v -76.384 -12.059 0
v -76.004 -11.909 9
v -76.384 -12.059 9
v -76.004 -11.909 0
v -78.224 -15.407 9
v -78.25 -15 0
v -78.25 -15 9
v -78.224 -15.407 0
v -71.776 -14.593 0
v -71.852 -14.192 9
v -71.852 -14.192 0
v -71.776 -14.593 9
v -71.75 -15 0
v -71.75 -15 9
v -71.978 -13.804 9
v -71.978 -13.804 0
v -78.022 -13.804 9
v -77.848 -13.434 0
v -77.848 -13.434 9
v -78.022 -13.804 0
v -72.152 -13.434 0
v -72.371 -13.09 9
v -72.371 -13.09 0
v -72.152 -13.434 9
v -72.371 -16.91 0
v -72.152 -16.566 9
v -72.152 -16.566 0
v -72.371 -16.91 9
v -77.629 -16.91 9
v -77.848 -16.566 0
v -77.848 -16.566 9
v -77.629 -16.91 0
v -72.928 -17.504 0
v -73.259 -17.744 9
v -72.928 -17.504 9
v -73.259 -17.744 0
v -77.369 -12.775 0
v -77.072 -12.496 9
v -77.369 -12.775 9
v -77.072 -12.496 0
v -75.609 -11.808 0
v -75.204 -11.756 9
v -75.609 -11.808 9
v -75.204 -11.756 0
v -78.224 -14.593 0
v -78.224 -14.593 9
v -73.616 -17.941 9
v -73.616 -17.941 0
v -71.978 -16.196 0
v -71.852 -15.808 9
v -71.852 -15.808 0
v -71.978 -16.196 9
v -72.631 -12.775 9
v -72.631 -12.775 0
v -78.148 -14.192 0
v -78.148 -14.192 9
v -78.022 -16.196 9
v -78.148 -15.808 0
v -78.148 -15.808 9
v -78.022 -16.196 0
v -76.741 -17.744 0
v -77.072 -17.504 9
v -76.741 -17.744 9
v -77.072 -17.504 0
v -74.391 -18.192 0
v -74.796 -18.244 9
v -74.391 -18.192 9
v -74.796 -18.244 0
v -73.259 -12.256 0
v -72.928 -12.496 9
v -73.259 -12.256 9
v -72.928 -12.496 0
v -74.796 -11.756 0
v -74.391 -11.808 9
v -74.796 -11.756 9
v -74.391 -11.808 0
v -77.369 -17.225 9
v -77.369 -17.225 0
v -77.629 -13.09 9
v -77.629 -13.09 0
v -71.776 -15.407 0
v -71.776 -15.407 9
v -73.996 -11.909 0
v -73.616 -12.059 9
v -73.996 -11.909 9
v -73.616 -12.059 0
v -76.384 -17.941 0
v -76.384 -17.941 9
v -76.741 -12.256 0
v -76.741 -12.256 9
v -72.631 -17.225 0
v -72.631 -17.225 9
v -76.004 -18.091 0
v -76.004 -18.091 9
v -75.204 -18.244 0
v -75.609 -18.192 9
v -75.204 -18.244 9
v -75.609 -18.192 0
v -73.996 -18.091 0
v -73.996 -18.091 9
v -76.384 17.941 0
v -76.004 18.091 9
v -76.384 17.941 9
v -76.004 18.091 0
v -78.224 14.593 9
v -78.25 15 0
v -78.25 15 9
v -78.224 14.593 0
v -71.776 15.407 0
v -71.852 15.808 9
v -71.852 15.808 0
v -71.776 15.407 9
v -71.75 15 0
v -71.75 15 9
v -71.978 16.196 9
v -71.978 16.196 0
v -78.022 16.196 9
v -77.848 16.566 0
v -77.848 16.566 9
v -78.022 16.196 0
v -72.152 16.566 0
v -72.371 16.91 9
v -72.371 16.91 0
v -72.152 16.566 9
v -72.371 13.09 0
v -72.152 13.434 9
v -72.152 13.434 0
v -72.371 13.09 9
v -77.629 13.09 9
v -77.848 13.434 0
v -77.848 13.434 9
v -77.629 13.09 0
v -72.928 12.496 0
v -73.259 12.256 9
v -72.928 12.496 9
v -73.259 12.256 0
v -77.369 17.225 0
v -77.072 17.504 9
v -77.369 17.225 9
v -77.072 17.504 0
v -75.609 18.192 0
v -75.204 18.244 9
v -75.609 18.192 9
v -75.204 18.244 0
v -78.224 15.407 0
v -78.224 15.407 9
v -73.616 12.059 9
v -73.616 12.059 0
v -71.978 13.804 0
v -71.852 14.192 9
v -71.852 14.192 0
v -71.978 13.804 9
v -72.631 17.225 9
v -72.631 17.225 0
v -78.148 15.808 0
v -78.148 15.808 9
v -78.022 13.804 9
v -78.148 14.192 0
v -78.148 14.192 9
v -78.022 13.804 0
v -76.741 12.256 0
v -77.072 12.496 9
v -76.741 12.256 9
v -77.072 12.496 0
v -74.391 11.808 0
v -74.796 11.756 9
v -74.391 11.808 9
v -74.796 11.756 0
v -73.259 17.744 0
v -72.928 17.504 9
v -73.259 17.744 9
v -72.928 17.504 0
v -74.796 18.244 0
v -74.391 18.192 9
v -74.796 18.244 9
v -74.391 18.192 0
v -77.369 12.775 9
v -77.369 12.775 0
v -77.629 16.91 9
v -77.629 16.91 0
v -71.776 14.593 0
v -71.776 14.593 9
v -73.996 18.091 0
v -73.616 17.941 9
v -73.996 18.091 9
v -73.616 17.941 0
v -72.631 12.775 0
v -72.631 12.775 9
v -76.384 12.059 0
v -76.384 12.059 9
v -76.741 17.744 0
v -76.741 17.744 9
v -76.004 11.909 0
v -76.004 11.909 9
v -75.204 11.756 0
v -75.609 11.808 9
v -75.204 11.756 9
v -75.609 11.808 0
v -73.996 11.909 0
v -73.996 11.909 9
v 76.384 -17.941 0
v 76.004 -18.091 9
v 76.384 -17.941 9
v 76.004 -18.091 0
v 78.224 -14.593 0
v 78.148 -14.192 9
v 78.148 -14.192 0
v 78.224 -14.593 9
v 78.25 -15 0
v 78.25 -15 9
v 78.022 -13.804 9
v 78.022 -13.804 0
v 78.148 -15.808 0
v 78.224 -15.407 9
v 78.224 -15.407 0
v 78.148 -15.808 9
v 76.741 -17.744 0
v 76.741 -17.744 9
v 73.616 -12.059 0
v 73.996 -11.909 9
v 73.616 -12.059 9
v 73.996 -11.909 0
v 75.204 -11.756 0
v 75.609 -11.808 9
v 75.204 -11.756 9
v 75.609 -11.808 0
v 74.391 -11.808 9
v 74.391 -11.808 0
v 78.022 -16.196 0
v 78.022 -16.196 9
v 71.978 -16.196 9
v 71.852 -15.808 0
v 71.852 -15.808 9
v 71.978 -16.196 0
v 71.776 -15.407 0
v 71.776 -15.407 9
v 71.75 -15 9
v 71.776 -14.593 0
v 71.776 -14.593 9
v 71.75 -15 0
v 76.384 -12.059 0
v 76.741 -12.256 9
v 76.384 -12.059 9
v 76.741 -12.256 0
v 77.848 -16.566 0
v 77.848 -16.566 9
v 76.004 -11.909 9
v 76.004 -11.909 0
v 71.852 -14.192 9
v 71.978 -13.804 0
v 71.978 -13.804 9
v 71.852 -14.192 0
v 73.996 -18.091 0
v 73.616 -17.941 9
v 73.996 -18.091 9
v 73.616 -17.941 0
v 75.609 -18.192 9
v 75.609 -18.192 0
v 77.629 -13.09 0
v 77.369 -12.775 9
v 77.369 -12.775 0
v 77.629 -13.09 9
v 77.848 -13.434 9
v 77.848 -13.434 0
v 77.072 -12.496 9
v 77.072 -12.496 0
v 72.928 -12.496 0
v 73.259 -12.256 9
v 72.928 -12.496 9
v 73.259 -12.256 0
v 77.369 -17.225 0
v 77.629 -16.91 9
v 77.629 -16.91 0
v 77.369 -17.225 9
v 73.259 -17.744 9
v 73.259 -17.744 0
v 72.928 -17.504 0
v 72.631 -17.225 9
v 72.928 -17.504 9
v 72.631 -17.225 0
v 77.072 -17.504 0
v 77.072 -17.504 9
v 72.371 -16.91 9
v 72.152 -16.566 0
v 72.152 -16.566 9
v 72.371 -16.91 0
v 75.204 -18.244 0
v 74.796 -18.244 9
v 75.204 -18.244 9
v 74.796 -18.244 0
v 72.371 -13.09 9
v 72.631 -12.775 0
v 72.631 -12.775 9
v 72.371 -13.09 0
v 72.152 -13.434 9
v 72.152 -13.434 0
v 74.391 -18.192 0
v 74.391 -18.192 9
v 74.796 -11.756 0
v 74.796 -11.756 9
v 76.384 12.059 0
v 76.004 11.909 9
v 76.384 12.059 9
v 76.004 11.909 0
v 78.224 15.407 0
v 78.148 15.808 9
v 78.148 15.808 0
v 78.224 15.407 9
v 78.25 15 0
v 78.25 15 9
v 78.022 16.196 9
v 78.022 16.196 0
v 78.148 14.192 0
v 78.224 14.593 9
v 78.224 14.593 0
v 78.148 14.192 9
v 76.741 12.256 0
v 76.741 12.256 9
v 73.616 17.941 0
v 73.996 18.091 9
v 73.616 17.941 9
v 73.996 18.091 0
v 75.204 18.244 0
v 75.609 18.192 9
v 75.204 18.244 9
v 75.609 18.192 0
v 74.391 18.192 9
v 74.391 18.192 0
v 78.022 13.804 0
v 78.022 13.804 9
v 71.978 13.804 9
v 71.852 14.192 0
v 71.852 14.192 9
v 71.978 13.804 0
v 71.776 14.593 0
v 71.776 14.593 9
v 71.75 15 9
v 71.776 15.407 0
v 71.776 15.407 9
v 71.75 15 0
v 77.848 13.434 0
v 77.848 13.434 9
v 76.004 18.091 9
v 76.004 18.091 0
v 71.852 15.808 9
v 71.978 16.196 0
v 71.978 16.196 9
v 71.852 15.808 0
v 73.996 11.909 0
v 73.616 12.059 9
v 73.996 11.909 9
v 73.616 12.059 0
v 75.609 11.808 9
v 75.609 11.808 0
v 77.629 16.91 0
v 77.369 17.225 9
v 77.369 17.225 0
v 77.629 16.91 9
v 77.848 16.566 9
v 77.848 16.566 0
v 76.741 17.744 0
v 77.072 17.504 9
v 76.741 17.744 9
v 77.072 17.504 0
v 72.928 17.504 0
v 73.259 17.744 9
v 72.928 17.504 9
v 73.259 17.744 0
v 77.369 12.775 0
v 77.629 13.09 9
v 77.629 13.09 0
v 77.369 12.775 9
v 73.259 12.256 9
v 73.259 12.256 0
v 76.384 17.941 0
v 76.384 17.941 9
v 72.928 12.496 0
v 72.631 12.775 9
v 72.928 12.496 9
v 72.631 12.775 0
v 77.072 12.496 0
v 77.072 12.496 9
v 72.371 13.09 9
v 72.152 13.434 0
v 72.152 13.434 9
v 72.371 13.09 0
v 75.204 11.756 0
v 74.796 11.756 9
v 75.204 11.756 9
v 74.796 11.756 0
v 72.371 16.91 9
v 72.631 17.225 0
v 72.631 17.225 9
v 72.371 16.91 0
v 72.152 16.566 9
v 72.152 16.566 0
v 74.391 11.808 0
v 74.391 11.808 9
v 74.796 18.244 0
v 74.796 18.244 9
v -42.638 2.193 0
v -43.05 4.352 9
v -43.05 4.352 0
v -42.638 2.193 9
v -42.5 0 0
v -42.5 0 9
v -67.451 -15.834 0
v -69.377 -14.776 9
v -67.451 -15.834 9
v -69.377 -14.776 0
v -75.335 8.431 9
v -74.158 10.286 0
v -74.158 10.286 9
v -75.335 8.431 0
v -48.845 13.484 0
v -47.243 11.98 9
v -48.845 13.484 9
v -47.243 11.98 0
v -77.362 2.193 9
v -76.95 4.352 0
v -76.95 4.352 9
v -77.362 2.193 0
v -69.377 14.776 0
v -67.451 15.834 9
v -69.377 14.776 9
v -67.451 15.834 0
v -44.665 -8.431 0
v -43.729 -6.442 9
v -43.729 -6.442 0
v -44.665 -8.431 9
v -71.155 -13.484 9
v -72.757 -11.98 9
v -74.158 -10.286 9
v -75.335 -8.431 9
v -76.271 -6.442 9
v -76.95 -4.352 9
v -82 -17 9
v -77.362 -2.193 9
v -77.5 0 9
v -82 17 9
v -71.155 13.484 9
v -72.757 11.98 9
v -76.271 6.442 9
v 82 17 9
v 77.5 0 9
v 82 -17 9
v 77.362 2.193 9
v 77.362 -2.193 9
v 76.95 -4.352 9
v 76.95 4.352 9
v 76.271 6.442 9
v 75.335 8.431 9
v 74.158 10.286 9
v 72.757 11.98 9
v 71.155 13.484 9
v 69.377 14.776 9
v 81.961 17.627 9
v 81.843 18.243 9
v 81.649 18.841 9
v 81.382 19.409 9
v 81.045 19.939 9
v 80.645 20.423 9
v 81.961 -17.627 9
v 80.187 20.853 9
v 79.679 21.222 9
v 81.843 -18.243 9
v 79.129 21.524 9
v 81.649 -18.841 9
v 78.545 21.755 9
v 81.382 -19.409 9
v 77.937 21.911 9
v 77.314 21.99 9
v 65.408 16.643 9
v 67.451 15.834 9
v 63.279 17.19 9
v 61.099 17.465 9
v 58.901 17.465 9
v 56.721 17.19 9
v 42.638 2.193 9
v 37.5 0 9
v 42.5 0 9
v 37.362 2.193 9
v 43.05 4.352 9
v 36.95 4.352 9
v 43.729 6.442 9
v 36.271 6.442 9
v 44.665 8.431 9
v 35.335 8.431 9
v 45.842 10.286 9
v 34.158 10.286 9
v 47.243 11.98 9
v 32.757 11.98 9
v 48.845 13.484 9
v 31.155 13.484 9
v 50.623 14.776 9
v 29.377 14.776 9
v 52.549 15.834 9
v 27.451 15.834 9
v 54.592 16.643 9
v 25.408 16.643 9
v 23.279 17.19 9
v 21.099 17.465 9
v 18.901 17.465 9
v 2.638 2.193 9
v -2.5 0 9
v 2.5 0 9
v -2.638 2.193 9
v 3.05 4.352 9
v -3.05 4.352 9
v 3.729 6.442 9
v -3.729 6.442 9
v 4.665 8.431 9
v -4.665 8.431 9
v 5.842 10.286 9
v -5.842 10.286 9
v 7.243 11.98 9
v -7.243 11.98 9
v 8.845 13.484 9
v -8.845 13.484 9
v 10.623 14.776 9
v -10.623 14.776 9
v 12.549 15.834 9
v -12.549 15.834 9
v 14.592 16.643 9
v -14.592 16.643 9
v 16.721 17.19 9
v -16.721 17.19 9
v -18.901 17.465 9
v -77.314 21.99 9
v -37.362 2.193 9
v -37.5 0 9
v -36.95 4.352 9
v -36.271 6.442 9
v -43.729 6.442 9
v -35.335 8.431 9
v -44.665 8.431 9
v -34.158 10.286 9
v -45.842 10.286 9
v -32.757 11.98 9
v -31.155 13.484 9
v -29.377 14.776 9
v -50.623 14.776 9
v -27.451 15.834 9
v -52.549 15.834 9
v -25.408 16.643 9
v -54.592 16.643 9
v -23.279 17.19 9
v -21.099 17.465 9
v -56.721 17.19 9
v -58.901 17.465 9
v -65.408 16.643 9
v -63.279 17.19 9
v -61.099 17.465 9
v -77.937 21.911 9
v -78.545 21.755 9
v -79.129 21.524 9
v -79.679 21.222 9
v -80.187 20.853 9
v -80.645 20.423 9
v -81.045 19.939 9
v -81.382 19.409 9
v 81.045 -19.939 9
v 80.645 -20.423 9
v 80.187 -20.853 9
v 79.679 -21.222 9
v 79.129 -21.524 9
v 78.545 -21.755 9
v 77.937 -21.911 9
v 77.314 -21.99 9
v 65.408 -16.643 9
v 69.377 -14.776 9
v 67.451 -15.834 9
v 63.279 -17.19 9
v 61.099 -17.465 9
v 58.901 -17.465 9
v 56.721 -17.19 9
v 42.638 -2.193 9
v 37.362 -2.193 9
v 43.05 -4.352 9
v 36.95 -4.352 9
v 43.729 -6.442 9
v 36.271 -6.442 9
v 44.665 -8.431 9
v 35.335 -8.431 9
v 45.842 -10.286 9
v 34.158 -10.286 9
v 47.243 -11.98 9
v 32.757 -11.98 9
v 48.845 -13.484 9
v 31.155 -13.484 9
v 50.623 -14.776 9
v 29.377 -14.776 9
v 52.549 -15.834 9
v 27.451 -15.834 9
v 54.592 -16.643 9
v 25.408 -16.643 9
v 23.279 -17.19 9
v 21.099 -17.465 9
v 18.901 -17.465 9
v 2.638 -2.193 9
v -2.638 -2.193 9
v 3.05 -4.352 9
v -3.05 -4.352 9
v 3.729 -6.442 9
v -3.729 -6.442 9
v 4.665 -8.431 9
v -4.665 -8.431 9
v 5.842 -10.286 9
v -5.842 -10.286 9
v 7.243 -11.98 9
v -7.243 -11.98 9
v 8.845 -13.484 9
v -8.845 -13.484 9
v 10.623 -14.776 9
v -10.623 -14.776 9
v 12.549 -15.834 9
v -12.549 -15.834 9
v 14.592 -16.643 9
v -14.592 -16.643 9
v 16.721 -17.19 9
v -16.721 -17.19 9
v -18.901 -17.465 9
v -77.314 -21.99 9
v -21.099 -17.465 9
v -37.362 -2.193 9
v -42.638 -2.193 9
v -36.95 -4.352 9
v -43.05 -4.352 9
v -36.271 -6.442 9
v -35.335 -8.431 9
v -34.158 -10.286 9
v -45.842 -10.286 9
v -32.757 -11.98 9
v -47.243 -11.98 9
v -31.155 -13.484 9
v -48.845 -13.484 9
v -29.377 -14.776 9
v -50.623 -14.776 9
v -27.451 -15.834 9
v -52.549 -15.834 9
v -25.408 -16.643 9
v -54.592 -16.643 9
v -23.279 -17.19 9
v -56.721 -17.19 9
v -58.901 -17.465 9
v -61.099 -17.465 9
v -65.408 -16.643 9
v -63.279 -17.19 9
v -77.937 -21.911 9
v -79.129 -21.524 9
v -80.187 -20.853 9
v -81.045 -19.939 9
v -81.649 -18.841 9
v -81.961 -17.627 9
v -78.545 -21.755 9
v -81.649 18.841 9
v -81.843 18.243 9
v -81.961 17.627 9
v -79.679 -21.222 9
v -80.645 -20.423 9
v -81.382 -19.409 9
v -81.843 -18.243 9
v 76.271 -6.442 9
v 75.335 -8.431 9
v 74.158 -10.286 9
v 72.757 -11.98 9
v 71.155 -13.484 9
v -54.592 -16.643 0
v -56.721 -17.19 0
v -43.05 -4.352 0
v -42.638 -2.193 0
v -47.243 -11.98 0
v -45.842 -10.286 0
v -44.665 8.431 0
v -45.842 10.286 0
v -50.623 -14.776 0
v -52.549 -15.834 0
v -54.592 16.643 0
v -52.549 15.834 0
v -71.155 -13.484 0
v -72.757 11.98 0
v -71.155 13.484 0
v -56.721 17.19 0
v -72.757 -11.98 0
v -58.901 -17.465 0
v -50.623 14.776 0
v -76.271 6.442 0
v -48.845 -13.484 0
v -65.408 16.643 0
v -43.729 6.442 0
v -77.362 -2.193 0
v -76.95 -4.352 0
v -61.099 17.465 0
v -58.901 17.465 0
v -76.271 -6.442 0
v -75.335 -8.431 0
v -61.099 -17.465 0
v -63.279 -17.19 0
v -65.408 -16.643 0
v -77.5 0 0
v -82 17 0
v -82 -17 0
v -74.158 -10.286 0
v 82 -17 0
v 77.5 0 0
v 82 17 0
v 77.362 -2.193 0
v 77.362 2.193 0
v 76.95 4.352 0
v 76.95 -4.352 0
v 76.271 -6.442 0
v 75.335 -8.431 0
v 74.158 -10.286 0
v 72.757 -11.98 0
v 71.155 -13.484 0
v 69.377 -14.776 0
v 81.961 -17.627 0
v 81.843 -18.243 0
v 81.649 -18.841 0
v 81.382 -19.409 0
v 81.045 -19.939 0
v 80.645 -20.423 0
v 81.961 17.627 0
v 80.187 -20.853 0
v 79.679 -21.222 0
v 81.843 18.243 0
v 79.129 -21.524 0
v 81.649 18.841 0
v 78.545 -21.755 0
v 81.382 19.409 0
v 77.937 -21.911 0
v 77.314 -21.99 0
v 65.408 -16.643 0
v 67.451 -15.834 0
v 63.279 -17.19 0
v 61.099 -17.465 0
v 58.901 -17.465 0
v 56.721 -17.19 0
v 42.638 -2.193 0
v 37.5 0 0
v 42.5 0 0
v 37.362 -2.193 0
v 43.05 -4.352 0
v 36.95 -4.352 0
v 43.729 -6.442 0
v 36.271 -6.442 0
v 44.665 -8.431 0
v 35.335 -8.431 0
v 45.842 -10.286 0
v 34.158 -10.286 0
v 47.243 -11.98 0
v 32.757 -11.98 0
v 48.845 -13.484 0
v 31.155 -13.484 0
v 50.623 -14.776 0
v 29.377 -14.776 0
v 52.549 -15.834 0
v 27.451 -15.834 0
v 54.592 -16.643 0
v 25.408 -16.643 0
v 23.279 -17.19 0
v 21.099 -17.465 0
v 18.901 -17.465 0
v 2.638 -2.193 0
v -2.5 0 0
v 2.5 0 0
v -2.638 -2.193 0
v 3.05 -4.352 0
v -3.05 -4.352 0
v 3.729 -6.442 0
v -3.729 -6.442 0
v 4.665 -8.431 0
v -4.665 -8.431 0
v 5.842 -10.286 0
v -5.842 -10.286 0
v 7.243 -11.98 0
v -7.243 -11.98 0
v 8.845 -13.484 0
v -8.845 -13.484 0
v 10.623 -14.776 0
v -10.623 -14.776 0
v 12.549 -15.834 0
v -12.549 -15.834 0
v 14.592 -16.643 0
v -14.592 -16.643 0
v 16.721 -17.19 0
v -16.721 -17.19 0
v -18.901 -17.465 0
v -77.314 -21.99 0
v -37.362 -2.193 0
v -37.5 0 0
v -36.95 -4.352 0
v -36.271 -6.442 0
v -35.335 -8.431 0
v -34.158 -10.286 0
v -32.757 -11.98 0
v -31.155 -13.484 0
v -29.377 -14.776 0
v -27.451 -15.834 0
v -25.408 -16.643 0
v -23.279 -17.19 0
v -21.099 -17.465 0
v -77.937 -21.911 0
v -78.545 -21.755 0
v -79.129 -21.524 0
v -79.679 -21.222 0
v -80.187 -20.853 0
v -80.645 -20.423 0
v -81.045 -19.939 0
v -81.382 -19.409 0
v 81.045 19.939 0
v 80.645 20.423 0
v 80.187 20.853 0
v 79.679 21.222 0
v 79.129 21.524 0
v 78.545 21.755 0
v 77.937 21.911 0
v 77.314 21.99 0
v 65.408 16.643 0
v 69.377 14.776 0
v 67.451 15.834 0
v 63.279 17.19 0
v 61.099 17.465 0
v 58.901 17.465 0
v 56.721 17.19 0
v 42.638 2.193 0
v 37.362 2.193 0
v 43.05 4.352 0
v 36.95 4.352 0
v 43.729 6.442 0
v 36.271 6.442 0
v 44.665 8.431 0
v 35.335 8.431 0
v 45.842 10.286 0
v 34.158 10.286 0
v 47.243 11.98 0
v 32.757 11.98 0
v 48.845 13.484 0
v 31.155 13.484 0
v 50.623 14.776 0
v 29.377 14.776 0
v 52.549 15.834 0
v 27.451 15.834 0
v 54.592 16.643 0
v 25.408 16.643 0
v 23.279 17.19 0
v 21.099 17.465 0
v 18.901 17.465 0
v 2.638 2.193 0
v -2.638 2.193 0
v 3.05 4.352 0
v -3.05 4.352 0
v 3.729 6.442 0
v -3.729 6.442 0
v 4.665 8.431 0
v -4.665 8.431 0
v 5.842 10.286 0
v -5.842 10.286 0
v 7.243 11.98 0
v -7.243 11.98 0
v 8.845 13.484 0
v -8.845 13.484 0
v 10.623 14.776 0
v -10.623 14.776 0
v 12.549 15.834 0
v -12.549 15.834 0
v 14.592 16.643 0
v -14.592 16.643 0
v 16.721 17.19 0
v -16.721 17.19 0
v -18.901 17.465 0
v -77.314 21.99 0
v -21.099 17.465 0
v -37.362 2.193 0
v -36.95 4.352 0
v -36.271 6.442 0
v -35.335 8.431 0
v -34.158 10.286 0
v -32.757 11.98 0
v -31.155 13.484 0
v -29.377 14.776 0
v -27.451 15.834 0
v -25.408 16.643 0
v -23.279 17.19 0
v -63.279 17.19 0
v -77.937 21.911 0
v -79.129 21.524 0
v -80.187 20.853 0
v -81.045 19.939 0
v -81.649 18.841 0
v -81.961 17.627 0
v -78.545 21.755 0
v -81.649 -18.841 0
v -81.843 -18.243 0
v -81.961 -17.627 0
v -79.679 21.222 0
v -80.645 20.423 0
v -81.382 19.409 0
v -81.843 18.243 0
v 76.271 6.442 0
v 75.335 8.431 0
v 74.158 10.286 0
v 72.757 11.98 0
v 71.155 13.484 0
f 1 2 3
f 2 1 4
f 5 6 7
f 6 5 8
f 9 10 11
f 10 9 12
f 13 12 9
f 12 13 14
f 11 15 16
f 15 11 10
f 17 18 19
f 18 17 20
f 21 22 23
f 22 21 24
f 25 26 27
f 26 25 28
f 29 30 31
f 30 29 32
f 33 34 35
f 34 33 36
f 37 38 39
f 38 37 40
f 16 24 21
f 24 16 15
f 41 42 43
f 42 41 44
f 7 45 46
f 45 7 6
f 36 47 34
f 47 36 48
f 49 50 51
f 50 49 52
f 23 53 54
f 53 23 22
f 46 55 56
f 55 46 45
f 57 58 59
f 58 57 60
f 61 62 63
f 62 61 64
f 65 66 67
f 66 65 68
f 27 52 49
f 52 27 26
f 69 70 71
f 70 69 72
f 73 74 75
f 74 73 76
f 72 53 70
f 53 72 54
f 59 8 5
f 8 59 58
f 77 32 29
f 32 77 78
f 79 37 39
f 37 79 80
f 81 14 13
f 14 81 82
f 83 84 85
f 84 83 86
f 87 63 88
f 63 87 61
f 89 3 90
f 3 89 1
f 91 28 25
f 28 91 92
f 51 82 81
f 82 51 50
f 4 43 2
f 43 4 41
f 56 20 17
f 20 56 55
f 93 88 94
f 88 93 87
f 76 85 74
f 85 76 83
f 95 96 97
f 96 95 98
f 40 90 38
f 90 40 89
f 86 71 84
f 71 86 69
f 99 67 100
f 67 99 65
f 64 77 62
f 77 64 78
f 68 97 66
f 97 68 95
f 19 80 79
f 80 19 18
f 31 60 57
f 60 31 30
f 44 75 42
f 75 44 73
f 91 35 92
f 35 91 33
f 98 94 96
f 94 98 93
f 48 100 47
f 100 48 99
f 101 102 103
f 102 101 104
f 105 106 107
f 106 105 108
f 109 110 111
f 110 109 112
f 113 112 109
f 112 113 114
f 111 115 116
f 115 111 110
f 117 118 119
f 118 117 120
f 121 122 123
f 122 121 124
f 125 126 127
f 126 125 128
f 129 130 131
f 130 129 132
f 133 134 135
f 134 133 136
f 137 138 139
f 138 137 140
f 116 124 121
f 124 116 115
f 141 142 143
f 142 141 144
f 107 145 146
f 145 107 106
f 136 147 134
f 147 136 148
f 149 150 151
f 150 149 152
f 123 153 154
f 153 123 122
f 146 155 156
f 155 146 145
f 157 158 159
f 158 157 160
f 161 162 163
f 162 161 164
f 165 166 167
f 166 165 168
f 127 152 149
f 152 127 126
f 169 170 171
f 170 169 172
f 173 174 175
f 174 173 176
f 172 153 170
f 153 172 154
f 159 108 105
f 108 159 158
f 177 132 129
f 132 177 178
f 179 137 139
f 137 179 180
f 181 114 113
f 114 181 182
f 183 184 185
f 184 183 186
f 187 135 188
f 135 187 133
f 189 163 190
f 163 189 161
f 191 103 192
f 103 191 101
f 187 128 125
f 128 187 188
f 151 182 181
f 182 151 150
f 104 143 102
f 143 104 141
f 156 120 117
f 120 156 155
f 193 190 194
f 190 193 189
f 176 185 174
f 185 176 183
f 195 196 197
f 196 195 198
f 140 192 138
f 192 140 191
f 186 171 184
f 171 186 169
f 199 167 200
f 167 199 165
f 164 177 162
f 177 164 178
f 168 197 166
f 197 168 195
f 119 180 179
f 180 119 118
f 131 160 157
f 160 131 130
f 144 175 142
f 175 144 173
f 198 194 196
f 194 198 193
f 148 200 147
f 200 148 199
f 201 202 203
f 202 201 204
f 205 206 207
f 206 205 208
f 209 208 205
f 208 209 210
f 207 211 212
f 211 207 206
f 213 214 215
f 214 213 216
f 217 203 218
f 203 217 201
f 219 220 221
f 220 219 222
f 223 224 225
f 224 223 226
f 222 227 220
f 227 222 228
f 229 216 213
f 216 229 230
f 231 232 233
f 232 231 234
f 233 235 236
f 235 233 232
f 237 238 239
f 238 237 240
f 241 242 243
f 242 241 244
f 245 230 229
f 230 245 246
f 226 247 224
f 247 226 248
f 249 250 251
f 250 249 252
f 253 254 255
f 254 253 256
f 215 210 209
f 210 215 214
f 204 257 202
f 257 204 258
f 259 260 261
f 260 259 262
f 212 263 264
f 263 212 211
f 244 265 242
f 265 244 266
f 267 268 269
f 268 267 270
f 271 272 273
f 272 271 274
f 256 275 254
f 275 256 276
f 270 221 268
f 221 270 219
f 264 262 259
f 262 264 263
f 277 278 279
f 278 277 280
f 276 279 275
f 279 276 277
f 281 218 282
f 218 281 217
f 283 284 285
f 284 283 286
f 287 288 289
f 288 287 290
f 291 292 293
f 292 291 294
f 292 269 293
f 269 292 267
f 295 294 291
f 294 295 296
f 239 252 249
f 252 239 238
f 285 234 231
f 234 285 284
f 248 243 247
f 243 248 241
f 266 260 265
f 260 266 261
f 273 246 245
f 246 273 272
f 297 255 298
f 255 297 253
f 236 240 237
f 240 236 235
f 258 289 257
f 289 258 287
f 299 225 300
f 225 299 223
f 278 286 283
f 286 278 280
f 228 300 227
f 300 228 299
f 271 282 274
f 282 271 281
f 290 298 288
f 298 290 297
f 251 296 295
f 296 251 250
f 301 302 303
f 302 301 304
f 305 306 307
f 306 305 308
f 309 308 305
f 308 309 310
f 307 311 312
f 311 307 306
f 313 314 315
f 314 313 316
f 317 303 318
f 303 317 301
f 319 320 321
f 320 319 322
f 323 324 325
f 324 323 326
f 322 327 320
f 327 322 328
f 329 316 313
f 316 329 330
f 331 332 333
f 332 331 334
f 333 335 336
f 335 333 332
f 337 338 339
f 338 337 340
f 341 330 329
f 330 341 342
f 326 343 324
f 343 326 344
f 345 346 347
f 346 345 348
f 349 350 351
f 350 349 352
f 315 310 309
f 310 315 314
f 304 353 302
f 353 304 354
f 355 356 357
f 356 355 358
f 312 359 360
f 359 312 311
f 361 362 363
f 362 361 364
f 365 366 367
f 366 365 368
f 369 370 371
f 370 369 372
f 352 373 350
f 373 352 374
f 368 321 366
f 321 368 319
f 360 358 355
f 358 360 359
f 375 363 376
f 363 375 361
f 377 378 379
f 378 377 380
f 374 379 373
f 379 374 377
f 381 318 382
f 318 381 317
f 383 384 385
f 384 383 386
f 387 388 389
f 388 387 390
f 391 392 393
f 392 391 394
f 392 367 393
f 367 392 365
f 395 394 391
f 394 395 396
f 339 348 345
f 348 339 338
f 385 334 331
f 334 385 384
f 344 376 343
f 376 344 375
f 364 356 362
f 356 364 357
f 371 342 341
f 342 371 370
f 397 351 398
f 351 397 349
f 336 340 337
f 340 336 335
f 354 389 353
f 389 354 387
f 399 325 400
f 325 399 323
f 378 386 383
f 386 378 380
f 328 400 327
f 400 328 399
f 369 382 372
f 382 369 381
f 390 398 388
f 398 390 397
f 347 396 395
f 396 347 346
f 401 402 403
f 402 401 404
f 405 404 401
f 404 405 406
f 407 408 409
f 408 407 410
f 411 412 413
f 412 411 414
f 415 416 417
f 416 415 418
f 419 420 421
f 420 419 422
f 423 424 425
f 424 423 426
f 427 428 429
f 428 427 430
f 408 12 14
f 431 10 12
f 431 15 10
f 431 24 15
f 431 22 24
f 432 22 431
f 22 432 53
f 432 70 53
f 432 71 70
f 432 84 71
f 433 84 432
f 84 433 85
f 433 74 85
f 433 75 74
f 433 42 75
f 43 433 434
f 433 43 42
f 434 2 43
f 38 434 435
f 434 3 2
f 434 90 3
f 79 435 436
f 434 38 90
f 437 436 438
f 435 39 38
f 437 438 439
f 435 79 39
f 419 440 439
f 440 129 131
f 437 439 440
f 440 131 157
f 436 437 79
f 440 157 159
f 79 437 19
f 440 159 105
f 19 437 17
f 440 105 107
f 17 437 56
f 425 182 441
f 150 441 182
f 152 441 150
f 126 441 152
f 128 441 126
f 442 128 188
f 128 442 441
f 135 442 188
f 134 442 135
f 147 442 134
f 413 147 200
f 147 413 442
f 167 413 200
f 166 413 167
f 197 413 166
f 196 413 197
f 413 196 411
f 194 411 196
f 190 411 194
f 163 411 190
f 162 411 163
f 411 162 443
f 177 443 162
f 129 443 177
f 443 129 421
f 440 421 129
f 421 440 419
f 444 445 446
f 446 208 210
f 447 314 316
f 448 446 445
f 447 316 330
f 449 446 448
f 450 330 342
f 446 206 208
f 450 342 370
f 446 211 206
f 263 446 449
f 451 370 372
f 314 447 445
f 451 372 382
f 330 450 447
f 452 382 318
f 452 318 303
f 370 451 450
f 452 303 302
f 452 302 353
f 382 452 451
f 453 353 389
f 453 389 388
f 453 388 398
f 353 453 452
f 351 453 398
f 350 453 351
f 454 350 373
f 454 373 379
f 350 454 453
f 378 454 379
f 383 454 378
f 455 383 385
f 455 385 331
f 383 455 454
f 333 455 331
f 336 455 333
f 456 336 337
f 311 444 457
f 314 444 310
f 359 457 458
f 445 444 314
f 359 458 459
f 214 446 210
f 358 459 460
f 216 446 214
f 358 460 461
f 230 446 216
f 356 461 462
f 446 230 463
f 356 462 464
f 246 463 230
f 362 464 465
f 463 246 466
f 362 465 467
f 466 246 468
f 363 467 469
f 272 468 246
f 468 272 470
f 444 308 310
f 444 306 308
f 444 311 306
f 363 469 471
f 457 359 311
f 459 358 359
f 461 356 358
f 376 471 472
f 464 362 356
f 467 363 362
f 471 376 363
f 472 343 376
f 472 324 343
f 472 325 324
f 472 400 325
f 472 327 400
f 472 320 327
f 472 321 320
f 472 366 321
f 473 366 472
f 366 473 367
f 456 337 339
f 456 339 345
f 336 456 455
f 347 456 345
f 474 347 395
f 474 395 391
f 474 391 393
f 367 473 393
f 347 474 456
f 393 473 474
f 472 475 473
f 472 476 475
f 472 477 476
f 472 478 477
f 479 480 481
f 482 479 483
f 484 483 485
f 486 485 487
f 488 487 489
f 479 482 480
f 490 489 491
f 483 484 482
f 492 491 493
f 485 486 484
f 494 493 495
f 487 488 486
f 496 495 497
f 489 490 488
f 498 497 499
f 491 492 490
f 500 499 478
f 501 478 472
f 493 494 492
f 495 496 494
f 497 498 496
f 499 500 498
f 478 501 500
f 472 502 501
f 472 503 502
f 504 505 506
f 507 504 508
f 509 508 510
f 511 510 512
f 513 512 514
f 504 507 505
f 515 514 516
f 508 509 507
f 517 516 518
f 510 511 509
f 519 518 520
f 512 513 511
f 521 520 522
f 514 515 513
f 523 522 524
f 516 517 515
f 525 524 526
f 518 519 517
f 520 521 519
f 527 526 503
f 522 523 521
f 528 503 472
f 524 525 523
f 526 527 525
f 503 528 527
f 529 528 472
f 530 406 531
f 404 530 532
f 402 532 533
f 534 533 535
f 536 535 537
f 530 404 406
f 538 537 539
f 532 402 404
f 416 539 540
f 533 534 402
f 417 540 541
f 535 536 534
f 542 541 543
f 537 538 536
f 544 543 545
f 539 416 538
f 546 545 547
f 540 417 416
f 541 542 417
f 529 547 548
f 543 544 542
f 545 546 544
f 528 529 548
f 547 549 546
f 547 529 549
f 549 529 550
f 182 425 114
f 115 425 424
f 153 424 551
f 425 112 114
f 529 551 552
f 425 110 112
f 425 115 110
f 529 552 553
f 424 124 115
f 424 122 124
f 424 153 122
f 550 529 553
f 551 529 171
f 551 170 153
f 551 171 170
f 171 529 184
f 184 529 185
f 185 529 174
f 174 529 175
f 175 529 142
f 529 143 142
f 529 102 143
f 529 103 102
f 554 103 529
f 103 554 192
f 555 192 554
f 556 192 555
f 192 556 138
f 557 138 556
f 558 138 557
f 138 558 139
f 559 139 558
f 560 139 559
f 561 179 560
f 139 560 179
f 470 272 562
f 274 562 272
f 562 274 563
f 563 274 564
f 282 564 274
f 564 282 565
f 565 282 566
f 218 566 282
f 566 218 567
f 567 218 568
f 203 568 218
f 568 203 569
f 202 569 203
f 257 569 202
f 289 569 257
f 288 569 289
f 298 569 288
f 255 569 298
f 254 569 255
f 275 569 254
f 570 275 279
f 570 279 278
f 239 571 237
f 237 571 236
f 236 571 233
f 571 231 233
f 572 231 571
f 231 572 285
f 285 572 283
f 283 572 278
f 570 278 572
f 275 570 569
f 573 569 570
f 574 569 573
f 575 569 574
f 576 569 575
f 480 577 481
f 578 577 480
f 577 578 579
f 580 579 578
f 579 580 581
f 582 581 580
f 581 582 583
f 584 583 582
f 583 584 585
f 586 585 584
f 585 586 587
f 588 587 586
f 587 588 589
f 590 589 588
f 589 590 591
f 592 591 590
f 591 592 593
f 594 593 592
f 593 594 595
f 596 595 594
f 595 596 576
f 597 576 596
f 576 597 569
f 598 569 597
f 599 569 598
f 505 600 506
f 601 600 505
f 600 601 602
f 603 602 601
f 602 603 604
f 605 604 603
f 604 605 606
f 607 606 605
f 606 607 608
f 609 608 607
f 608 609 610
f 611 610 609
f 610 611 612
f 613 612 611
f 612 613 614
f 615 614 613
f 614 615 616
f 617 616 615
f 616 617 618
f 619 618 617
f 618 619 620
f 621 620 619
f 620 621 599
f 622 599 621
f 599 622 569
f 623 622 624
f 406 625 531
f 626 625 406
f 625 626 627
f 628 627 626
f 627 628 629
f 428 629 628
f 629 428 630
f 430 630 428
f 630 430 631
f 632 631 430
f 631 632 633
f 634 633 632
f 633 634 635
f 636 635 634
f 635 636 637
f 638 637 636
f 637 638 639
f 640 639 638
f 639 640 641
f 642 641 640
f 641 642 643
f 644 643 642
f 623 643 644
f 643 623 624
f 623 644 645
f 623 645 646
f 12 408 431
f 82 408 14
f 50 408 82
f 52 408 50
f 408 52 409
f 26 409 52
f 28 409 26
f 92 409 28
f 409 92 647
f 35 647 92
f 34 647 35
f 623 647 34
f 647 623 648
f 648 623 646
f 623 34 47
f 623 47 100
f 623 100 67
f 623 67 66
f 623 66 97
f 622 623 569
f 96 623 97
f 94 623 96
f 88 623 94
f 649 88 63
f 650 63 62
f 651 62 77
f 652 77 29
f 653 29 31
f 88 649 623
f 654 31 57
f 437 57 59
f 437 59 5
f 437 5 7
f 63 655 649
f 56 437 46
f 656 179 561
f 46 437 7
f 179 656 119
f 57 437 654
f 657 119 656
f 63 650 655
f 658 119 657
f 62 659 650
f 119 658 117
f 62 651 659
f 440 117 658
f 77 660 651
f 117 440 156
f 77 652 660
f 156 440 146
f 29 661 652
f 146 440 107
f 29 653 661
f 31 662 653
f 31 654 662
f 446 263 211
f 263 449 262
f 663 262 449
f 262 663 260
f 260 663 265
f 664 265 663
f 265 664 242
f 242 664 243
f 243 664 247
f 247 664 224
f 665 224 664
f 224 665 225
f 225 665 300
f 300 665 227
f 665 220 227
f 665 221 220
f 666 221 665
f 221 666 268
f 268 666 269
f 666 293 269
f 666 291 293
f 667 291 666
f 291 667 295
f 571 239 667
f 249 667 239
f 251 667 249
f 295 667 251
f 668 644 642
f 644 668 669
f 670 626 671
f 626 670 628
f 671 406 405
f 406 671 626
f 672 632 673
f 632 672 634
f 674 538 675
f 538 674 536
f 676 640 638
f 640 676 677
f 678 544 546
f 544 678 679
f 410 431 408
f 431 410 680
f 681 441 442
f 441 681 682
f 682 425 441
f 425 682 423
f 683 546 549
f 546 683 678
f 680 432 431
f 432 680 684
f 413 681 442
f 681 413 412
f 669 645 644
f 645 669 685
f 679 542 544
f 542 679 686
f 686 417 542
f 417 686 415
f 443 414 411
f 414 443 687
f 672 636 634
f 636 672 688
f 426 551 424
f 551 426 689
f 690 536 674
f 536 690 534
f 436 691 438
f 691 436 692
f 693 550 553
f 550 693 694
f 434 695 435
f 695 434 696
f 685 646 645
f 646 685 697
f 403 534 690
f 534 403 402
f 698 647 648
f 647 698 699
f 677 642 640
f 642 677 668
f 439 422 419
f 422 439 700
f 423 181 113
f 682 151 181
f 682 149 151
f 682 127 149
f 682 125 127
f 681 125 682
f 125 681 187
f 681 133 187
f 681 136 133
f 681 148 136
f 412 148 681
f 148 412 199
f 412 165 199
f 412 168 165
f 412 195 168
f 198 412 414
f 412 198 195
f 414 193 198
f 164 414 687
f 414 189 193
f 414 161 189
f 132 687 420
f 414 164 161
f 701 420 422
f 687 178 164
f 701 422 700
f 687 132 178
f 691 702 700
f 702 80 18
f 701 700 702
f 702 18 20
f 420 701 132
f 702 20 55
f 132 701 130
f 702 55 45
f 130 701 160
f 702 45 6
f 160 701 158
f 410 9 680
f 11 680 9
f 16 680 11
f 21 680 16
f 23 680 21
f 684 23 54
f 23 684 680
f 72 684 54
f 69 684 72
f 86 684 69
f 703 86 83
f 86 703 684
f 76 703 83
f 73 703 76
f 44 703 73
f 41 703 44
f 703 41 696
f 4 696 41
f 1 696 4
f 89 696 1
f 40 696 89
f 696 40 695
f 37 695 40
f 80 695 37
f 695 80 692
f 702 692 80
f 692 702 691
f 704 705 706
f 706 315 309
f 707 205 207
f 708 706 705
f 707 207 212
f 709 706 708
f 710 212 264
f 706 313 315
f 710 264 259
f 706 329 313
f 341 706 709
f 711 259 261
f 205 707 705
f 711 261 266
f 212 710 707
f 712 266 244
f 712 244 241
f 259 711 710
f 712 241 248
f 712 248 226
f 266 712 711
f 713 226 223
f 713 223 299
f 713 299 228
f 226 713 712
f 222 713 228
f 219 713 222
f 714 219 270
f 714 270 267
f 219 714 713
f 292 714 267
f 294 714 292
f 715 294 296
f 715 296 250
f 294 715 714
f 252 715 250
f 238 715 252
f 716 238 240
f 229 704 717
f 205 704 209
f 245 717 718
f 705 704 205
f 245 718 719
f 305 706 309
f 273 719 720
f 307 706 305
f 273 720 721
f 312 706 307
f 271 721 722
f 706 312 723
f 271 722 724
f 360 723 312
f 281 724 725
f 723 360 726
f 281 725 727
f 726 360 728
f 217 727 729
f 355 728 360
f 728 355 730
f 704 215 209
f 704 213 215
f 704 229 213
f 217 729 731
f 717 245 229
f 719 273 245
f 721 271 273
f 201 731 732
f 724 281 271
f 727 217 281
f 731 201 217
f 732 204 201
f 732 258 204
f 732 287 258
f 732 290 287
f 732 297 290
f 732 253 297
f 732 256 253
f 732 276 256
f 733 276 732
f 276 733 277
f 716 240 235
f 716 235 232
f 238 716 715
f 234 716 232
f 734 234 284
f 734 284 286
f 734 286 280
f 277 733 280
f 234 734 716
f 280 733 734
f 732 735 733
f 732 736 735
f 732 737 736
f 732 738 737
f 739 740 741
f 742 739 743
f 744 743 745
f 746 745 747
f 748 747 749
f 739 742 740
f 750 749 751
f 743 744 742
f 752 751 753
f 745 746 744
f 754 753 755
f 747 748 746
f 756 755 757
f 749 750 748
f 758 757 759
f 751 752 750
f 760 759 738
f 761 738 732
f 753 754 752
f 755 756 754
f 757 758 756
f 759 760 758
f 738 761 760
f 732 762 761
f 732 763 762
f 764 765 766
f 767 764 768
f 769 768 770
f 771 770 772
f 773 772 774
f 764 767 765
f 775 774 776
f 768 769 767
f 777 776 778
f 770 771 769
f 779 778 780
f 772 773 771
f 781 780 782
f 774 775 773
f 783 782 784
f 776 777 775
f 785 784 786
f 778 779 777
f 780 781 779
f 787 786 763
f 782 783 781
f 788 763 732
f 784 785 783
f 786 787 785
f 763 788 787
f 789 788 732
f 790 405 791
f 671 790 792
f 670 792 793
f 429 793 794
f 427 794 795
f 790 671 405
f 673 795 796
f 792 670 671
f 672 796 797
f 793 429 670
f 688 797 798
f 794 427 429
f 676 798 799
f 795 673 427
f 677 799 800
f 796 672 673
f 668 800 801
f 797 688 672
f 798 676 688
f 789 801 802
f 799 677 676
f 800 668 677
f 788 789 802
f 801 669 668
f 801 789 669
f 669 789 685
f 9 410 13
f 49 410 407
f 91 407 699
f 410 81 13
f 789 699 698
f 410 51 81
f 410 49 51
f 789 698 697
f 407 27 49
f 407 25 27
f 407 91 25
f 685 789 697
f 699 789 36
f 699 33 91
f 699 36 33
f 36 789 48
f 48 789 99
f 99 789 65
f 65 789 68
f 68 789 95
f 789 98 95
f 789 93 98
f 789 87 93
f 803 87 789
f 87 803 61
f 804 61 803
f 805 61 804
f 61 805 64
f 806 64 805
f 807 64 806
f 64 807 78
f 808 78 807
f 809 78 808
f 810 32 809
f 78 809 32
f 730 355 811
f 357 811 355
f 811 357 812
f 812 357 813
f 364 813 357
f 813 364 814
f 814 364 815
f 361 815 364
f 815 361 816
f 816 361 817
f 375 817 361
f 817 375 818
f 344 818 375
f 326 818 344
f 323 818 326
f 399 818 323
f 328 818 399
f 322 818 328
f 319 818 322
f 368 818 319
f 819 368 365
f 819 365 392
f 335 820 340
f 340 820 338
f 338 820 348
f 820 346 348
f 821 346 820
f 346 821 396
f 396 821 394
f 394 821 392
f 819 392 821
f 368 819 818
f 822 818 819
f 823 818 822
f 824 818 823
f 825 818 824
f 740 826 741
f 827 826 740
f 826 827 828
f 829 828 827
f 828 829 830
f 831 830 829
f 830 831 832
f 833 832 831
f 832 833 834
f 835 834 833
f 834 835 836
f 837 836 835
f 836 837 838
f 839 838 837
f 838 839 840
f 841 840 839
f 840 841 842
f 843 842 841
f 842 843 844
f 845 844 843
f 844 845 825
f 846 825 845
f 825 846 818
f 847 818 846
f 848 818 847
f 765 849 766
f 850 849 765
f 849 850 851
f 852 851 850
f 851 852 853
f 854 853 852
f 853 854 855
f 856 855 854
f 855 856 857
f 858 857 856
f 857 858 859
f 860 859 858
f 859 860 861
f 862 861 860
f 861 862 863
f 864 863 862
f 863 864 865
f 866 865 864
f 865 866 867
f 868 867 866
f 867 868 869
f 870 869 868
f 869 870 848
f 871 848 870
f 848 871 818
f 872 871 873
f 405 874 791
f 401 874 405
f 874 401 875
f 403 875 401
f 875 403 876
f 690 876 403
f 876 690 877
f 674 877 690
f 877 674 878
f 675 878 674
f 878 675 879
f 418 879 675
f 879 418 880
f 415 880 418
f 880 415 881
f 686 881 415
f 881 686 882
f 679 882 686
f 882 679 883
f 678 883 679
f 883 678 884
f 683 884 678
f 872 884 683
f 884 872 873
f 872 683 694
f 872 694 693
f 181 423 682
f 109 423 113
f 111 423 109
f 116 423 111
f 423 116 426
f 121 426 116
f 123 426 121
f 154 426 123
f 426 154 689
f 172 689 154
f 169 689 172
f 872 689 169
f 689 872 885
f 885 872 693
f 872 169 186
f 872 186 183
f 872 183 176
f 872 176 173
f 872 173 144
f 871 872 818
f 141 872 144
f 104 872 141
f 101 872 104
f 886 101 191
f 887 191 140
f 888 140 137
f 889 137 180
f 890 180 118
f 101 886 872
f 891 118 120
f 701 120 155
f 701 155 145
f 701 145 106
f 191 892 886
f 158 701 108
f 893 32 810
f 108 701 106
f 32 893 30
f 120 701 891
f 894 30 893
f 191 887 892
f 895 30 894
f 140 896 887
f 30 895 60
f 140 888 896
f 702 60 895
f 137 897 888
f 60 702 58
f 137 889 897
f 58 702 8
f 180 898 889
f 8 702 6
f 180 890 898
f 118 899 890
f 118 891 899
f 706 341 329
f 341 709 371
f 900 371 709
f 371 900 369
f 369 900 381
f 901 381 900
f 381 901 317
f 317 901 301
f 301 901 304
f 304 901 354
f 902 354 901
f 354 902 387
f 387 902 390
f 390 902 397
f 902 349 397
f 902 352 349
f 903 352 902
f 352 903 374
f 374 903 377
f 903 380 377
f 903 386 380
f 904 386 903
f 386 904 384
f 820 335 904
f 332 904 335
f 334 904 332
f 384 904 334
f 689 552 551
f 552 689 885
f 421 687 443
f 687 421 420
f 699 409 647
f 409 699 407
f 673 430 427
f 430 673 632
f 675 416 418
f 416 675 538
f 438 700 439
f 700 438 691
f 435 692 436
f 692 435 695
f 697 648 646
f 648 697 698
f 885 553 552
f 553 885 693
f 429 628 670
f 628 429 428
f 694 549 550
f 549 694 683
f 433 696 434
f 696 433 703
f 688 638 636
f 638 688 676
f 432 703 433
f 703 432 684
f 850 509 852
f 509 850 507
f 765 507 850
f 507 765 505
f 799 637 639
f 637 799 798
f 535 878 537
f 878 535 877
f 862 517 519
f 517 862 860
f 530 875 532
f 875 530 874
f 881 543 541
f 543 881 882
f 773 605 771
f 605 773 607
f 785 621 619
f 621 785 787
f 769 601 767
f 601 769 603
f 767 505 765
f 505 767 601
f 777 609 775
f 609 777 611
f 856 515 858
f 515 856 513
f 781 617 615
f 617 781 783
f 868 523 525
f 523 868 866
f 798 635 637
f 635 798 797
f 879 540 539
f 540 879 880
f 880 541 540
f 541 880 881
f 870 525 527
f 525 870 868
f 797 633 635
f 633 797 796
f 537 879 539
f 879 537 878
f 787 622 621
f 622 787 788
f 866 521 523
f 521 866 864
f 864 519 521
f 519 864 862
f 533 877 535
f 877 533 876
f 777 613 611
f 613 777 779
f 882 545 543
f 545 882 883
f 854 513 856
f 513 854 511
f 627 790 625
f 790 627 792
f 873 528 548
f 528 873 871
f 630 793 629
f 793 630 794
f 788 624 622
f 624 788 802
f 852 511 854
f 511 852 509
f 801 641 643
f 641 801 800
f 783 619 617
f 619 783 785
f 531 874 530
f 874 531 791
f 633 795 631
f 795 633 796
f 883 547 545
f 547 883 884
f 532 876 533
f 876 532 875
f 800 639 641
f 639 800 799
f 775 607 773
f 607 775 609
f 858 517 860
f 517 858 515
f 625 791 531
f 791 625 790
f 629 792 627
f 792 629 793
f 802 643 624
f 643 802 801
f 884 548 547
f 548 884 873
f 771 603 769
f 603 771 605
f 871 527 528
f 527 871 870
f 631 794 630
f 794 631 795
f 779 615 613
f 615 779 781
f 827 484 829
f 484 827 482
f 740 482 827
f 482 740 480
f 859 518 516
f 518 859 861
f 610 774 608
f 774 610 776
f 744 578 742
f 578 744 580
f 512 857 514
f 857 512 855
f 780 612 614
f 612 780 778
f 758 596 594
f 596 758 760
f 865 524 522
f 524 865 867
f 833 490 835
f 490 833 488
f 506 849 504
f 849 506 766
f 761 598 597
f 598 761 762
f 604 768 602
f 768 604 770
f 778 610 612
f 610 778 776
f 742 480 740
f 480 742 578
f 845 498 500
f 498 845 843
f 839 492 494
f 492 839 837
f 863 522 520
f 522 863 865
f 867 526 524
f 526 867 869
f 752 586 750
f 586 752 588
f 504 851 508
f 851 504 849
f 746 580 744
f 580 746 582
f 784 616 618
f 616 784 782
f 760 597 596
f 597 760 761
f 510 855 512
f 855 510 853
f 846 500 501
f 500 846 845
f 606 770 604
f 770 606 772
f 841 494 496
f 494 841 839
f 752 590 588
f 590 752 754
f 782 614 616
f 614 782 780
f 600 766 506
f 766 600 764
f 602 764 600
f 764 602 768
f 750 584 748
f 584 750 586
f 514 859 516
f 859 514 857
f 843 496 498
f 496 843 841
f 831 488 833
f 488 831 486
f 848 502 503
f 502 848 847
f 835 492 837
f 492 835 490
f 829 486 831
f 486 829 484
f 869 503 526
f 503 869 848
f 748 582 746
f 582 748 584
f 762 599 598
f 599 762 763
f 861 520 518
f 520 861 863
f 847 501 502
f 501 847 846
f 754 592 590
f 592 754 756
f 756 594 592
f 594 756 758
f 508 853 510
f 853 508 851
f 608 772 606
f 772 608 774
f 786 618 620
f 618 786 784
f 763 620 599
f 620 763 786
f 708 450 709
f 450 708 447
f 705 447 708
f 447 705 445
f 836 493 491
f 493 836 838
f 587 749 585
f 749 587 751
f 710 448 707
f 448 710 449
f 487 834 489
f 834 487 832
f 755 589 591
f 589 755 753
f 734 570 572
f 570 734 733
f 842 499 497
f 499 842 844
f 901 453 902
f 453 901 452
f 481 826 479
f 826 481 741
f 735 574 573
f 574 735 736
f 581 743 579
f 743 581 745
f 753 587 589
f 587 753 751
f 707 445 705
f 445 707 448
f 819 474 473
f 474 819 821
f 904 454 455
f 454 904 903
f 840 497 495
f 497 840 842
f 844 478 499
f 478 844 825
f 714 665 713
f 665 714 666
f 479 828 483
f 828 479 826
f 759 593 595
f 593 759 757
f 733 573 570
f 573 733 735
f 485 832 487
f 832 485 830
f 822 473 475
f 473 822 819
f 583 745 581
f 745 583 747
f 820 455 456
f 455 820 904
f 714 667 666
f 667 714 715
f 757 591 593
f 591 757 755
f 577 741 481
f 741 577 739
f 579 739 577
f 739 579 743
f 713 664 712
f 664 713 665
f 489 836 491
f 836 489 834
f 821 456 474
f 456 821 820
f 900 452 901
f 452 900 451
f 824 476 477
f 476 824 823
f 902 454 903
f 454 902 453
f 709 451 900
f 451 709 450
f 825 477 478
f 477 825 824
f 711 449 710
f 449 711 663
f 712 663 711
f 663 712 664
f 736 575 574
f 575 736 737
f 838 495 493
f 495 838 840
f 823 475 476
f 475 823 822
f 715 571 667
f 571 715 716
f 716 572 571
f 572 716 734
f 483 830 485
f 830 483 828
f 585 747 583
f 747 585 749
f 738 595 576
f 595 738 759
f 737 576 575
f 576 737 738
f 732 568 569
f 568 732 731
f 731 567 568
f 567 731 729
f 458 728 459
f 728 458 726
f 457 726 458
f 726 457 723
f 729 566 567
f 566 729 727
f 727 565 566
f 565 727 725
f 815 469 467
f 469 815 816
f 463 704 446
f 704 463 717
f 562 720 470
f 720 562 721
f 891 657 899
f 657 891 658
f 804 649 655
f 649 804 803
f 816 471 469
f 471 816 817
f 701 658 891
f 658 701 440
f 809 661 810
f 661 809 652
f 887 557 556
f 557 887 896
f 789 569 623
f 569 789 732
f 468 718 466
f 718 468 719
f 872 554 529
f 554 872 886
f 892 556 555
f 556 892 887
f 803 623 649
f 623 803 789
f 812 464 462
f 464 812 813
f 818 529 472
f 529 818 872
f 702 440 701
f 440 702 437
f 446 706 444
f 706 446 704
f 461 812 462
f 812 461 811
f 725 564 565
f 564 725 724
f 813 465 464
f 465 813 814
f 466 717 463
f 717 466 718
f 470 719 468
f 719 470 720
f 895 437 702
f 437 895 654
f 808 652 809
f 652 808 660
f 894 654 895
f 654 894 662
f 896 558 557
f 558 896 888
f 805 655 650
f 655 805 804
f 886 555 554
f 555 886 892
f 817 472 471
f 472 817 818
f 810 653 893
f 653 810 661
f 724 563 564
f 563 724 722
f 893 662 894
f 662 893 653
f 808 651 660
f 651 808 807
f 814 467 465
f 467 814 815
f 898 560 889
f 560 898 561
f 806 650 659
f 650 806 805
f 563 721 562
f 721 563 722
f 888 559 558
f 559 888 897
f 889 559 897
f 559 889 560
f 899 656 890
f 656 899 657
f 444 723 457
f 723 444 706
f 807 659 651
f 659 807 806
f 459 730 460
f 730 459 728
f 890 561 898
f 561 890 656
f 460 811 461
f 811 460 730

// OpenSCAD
$fn = 50;

difference() {
	union() {
		hull() {
			translate(v = [-77.0, 17.0, 0]) {
				cylinder(h = 9, r = 5);
			}
			translate(v = [77.0, 17.0, 0]) {
				cylinder(h = 9, r = 5);
			}
			translate(v = [-77.0, -17.0, 0]) {
				cylinder(h = 9, r = 5);
			}
			translate(v = [77.0, -17.0, 0]) {
				cylinder(h = 9, r = 5);
			}
		}
	}
	union() {
		translate(v = [-75.0, -15.0, -100.0]) {
			cylinder(h = 200, r = 3.25);
		}
		translate(v = [-75.0, 15.0, -100.0]) {
			cylinder(h = 200, r = 3.25);
		}
		translate(v = [75.0, -15.0, -100.0]) {
			cylinder(h = 200, r = 3.25);
		}
		translate(v = [75.0, 15.0, -100.0]) {
			cylinder(h = 200, r = 3.25);
		}
		translate(v = [-75.0, -15.0, -100.0]) {
			cylinder(h = 200, r = 1.8);
		}
		translate(v = [-75.0, 15.0, -100.0]) {
			cylinder(h = 200, r = 1.8);
		}
		translate(v = [75.0, -15.0, -100.0]) {
			cylinder(h = 200, r = 1.8);
		}
		translate(v = [75.0, 15.0, -100.0]) {
			cylinder(h = 200, r = 1.8);
		}
		translate(v = [-60.0, 0, 0.0]) {
			cylinder(h = 9, r = 17.5);
		}
		translate(v = [-20.0, 0, 0.0]) {
			cylinder(h = 9, r = 17.5);
		}
		translate(v = [20.0, 0, 0.0]) {
			cylinder(h = 9, r = 17.5);
		}
		translate(v = [60.0, 0, 0.0]) {
			cylinder(h = 9, r = 17.5);
		}
	}
}
